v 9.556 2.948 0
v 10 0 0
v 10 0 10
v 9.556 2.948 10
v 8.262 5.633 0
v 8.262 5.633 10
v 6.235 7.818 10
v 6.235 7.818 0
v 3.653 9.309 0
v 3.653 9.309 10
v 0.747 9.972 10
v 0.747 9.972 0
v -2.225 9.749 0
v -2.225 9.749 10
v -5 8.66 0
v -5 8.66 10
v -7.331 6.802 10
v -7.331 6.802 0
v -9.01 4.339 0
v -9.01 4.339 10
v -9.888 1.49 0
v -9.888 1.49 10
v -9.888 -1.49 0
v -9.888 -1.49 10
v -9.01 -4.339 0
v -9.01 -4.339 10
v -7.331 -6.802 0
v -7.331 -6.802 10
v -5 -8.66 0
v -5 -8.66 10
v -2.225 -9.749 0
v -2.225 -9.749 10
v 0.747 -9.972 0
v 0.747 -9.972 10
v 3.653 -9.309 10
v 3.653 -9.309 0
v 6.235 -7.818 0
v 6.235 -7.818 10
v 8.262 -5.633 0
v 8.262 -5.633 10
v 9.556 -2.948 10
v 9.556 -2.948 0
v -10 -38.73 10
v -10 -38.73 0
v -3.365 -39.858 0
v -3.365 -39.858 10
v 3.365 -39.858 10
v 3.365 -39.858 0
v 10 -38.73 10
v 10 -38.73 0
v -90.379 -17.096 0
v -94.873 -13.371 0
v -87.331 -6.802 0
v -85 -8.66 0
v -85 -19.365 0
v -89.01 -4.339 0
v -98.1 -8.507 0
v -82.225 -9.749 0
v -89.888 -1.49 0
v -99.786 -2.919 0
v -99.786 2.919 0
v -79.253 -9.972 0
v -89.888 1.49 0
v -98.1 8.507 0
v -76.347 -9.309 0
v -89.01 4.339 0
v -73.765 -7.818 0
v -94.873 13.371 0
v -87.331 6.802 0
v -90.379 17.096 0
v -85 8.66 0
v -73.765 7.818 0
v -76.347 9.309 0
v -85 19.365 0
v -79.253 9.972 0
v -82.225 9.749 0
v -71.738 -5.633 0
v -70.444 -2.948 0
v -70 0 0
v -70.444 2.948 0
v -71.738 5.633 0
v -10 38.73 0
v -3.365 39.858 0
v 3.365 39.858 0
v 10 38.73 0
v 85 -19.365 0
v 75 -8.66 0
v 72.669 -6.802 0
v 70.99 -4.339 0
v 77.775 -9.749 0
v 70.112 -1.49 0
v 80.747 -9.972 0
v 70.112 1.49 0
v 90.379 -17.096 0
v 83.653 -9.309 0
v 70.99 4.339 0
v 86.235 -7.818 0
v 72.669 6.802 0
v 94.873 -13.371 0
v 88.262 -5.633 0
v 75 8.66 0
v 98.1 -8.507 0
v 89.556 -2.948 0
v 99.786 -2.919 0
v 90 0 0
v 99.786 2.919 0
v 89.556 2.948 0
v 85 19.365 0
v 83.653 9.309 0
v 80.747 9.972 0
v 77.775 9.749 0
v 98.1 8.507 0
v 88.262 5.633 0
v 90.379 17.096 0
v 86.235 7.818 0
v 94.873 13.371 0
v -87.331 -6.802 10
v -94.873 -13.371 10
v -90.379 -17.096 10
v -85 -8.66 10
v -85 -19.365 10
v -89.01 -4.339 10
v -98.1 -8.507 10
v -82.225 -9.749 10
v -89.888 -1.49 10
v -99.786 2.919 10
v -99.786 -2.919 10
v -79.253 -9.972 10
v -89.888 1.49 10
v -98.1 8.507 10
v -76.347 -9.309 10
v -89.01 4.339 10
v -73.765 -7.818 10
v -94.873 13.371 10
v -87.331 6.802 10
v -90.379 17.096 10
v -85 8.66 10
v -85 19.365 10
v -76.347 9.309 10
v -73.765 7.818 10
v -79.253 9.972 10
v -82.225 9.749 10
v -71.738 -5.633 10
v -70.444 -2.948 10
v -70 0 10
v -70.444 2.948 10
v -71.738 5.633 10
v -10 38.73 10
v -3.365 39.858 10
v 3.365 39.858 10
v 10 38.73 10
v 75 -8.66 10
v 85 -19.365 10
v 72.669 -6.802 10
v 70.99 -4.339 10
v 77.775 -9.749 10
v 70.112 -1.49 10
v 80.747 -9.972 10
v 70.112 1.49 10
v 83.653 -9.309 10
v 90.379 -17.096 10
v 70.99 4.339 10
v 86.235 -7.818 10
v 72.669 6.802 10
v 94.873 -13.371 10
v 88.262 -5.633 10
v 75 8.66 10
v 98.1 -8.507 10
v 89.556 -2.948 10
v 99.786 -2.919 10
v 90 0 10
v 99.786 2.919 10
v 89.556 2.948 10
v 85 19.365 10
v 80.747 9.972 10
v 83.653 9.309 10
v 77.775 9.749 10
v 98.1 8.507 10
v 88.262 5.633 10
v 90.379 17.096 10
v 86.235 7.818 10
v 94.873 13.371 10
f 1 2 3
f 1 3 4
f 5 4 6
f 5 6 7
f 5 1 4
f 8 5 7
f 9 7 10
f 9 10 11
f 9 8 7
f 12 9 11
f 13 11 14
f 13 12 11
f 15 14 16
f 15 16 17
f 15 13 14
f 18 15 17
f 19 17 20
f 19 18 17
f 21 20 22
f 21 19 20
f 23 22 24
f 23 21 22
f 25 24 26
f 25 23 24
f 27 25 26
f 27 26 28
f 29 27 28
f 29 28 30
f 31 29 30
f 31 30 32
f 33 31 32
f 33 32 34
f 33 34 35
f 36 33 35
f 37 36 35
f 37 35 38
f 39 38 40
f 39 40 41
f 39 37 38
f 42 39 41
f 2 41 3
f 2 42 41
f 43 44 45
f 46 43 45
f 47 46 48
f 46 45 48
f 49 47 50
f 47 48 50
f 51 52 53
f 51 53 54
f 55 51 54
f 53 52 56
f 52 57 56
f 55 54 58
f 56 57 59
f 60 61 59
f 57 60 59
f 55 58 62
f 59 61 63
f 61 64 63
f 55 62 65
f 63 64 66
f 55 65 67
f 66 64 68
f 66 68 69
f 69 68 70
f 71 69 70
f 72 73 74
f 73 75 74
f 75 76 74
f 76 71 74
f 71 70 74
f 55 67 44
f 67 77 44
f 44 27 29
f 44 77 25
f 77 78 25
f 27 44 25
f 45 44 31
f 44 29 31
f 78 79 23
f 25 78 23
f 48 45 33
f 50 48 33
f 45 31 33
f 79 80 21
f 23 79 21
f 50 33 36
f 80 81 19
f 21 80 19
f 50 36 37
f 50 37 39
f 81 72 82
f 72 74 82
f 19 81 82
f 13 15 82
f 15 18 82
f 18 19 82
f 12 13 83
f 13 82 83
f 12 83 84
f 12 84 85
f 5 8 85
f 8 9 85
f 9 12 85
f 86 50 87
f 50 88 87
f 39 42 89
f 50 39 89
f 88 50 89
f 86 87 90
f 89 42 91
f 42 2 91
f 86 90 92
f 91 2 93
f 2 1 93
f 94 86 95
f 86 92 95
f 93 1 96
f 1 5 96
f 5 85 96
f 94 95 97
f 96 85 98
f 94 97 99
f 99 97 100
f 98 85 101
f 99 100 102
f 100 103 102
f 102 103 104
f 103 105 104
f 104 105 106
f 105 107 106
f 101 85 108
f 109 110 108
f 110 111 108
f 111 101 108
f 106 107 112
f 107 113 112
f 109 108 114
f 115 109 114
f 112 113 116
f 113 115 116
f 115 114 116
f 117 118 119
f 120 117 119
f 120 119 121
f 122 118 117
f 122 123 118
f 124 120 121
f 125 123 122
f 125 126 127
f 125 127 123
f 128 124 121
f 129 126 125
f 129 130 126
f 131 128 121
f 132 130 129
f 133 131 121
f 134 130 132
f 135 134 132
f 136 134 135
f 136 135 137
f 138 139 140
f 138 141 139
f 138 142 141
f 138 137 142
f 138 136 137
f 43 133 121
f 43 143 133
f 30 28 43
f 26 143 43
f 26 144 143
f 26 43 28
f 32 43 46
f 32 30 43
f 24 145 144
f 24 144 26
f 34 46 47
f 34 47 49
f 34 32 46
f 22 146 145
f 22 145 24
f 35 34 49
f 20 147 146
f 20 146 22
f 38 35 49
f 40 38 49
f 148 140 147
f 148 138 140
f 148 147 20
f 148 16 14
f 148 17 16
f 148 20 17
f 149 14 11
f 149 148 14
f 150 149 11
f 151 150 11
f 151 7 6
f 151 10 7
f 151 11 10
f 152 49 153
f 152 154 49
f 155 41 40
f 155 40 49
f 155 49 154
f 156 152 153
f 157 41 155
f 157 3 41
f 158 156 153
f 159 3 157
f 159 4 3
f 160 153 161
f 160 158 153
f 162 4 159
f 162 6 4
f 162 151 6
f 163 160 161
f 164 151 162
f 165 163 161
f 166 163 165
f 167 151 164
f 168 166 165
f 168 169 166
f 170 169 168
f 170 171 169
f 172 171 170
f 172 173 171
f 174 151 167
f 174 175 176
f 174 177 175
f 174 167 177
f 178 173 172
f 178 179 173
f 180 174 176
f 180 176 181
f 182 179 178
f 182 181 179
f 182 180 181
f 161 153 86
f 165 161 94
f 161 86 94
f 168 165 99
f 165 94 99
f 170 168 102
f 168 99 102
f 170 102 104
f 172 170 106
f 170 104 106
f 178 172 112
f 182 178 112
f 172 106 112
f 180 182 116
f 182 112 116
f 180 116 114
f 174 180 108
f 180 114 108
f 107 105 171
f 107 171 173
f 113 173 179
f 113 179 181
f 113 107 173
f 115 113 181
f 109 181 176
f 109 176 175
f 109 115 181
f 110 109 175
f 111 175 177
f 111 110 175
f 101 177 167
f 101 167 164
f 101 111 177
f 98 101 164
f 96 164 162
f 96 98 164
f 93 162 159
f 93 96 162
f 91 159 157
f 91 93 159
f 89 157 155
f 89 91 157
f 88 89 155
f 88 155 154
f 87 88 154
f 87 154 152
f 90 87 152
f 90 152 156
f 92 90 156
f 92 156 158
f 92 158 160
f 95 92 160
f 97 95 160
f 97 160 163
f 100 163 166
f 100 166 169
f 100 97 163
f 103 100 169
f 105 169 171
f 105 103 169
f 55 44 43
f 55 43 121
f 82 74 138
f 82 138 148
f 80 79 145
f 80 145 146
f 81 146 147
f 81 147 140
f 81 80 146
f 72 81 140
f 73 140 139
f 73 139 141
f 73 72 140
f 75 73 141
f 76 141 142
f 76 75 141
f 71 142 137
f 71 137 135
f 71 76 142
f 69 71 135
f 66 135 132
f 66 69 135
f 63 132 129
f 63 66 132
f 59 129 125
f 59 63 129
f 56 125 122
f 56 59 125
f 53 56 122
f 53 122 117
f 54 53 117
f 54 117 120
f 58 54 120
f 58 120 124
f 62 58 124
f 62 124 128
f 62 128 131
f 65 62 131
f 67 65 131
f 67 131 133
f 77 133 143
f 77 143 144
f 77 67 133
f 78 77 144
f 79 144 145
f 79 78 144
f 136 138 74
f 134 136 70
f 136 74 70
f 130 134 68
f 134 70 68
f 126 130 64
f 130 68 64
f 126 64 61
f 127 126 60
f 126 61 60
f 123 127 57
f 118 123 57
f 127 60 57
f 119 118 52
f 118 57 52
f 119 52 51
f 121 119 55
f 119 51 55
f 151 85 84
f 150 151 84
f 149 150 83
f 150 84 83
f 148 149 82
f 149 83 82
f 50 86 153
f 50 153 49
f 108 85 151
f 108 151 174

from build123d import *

# Parameters (mm, degrees)
SKETCH_R      = 10
EXTRUDE_DEPTH = 10


with BuildPart() as part:
    # Sketch → Extrude (new body)
    with BuildSketch(Plane.XY):
        with BuildLine():
            ThreePointArc((-10, -38.729833), (0, -40), (10, -38.729833))
            Line((85, -19.364917), (10, -38.729833))
            ThreePointArc((85, -19.364917), (100, 0), (85, 19.364917))
            Line((10, 38.729833), (85, 19.364917))
            ThreePointArc((10, 38.729833), (0, 40), (-10, 38.729833))
            Line((-85, 19.364917), (-10, 38.729833))
            ThreePointArc((-85, 19.364917), (-100, 0), (-85, -19.364917))
            Line((-10, -38.729833), (-85, -19.364917))
        make_face()
        Circle(SKETCH_R, mode=Mode.SUBTRACT)
        with Locations((-80, 0)):
            Circle(SKETCH_R, mode=Mode.SUBTRACT)
        with Locations((80, 0)):
            Circle(SKETCH_R, mode=Mode.SUBTRACT)
    extrude(amount=EXTRUDE_DEPTH)


solid = part.part
